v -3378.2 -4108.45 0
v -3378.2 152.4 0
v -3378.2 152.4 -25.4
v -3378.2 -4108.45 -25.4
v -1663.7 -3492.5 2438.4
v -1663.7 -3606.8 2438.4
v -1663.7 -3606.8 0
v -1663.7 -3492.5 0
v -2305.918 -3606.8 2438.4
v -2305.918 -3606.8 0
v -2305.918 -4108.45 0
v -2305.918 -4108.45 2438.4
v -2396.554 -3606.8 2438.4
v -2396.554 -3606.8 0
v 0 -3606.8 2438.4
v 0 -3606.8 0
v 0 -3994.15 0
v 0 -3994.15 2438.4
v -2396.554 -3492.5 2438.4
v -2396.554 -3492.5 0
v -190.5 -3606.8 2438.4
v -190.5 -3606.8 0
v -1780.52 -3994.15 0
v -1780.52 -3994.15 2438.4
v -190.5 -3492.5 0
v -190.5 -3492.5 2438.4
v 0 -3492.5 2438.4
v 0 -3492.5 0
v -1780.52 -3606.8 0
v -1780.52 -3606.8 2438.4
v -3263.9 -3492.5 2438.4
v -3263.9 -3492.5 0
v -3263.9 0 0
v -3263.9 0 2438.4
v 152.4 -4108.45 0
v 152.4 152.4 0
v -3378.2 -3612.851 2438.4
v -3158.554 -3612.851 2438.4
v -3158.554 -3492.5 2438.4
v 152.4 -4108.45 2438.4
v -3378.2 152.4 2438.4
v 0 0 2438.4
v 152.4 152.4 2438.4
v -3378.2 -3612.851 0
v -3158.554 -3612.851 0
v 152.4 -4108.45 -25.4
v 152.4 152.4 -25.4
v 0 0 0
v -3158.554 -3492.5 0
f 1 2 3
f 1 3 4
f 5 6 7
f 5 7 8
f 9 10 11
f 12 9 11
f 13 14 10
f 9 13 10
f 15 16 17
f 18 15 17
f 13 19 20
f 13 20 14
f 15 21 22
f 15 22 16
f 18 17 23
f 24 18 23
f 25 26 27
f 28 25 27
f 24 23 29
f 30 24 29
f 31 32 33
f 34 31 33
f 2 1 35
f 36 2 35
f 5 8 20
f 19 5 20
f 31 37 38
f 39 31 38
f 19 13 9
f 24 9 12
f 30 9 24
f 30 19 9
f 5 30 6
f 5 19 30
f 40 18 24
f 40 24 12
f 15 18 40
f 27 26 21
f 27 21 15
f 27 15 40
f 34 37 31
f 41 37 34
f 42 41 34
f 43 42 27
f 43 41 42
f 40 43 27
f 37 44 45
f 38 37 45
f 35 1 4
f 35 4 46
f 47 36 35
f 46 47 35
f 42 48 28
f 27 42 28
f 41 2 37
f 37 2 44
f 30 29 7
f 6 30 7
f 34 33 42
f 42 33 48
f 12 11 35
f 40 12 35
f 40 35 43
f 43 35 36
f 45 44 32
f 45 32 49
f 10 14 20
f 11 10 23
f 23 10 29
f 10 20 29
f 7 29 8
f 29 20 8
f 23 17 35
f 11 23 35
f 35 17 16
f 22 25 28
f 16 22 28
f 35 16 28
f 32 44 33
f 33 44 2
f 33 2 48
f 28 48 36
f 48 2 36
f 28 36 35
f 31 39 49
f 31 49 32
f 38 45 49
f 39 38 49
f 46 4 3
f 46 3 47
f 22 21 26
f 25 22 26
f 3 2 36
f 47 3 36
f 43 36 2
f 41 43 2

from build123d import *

# Parameters (mm, degrees)
F0_W     = 190.5
F0_H     = 114.3
F1_DEPTH = 2438.4
F2_W     = 3530.6
F2_H     = 4260.85
F3_DEPTH = 25.4


with BuildPart() as f1:
    # F0 (on Top) → F1 (new body)
    with BuildSketch(Plane.XY):
        Polygon((-3263.9, 0), (0, 0), (0, -3492.5), (0, -3606.8), (0, -3994.15), (-1780.519962, -3994.15), (-1780.519962, -3606.8), (-2305.91774, -3606.8), (-2305.91774, -4108.45), (152.4, -4108.45), (152.4, 152.4), (-3378.2, 152.4), (-3378.2, -3612.851381), (-3263.9, -3612.851381), (-3158.5536, -3612.851381), (-3158.5536, -3492.5), (-3263.9, -3492.5), align=None)
        with Locations((-95.25, -3549.65)):
            Rectangle(F0_W, F0_H)
        Polygon((-2305.91774, -3606.8), (-1780.519962, -3606.8), (-1663.7, -3606.8), (-1663.7, -3492.5), (-2396.5536, -3492.5), (-2396.5536, -3606.8), align=None)
    extrude(amount=F1_DEPTH)


with BuildPart() as f3:
    # F2 (on face) → F3 (new body)
    with BuildSketch(Plane(origin=(0, 0, 0), x_dir=(1, 0, 0), z_dir=(0, 0, -1))):
        with Locations((-1612.9, 1978.025)):
            Rectangle(F2_W, F2_H)
    extrude(amount=F3_DEPTH)


solid = Compound([f1.part, f3.part])
